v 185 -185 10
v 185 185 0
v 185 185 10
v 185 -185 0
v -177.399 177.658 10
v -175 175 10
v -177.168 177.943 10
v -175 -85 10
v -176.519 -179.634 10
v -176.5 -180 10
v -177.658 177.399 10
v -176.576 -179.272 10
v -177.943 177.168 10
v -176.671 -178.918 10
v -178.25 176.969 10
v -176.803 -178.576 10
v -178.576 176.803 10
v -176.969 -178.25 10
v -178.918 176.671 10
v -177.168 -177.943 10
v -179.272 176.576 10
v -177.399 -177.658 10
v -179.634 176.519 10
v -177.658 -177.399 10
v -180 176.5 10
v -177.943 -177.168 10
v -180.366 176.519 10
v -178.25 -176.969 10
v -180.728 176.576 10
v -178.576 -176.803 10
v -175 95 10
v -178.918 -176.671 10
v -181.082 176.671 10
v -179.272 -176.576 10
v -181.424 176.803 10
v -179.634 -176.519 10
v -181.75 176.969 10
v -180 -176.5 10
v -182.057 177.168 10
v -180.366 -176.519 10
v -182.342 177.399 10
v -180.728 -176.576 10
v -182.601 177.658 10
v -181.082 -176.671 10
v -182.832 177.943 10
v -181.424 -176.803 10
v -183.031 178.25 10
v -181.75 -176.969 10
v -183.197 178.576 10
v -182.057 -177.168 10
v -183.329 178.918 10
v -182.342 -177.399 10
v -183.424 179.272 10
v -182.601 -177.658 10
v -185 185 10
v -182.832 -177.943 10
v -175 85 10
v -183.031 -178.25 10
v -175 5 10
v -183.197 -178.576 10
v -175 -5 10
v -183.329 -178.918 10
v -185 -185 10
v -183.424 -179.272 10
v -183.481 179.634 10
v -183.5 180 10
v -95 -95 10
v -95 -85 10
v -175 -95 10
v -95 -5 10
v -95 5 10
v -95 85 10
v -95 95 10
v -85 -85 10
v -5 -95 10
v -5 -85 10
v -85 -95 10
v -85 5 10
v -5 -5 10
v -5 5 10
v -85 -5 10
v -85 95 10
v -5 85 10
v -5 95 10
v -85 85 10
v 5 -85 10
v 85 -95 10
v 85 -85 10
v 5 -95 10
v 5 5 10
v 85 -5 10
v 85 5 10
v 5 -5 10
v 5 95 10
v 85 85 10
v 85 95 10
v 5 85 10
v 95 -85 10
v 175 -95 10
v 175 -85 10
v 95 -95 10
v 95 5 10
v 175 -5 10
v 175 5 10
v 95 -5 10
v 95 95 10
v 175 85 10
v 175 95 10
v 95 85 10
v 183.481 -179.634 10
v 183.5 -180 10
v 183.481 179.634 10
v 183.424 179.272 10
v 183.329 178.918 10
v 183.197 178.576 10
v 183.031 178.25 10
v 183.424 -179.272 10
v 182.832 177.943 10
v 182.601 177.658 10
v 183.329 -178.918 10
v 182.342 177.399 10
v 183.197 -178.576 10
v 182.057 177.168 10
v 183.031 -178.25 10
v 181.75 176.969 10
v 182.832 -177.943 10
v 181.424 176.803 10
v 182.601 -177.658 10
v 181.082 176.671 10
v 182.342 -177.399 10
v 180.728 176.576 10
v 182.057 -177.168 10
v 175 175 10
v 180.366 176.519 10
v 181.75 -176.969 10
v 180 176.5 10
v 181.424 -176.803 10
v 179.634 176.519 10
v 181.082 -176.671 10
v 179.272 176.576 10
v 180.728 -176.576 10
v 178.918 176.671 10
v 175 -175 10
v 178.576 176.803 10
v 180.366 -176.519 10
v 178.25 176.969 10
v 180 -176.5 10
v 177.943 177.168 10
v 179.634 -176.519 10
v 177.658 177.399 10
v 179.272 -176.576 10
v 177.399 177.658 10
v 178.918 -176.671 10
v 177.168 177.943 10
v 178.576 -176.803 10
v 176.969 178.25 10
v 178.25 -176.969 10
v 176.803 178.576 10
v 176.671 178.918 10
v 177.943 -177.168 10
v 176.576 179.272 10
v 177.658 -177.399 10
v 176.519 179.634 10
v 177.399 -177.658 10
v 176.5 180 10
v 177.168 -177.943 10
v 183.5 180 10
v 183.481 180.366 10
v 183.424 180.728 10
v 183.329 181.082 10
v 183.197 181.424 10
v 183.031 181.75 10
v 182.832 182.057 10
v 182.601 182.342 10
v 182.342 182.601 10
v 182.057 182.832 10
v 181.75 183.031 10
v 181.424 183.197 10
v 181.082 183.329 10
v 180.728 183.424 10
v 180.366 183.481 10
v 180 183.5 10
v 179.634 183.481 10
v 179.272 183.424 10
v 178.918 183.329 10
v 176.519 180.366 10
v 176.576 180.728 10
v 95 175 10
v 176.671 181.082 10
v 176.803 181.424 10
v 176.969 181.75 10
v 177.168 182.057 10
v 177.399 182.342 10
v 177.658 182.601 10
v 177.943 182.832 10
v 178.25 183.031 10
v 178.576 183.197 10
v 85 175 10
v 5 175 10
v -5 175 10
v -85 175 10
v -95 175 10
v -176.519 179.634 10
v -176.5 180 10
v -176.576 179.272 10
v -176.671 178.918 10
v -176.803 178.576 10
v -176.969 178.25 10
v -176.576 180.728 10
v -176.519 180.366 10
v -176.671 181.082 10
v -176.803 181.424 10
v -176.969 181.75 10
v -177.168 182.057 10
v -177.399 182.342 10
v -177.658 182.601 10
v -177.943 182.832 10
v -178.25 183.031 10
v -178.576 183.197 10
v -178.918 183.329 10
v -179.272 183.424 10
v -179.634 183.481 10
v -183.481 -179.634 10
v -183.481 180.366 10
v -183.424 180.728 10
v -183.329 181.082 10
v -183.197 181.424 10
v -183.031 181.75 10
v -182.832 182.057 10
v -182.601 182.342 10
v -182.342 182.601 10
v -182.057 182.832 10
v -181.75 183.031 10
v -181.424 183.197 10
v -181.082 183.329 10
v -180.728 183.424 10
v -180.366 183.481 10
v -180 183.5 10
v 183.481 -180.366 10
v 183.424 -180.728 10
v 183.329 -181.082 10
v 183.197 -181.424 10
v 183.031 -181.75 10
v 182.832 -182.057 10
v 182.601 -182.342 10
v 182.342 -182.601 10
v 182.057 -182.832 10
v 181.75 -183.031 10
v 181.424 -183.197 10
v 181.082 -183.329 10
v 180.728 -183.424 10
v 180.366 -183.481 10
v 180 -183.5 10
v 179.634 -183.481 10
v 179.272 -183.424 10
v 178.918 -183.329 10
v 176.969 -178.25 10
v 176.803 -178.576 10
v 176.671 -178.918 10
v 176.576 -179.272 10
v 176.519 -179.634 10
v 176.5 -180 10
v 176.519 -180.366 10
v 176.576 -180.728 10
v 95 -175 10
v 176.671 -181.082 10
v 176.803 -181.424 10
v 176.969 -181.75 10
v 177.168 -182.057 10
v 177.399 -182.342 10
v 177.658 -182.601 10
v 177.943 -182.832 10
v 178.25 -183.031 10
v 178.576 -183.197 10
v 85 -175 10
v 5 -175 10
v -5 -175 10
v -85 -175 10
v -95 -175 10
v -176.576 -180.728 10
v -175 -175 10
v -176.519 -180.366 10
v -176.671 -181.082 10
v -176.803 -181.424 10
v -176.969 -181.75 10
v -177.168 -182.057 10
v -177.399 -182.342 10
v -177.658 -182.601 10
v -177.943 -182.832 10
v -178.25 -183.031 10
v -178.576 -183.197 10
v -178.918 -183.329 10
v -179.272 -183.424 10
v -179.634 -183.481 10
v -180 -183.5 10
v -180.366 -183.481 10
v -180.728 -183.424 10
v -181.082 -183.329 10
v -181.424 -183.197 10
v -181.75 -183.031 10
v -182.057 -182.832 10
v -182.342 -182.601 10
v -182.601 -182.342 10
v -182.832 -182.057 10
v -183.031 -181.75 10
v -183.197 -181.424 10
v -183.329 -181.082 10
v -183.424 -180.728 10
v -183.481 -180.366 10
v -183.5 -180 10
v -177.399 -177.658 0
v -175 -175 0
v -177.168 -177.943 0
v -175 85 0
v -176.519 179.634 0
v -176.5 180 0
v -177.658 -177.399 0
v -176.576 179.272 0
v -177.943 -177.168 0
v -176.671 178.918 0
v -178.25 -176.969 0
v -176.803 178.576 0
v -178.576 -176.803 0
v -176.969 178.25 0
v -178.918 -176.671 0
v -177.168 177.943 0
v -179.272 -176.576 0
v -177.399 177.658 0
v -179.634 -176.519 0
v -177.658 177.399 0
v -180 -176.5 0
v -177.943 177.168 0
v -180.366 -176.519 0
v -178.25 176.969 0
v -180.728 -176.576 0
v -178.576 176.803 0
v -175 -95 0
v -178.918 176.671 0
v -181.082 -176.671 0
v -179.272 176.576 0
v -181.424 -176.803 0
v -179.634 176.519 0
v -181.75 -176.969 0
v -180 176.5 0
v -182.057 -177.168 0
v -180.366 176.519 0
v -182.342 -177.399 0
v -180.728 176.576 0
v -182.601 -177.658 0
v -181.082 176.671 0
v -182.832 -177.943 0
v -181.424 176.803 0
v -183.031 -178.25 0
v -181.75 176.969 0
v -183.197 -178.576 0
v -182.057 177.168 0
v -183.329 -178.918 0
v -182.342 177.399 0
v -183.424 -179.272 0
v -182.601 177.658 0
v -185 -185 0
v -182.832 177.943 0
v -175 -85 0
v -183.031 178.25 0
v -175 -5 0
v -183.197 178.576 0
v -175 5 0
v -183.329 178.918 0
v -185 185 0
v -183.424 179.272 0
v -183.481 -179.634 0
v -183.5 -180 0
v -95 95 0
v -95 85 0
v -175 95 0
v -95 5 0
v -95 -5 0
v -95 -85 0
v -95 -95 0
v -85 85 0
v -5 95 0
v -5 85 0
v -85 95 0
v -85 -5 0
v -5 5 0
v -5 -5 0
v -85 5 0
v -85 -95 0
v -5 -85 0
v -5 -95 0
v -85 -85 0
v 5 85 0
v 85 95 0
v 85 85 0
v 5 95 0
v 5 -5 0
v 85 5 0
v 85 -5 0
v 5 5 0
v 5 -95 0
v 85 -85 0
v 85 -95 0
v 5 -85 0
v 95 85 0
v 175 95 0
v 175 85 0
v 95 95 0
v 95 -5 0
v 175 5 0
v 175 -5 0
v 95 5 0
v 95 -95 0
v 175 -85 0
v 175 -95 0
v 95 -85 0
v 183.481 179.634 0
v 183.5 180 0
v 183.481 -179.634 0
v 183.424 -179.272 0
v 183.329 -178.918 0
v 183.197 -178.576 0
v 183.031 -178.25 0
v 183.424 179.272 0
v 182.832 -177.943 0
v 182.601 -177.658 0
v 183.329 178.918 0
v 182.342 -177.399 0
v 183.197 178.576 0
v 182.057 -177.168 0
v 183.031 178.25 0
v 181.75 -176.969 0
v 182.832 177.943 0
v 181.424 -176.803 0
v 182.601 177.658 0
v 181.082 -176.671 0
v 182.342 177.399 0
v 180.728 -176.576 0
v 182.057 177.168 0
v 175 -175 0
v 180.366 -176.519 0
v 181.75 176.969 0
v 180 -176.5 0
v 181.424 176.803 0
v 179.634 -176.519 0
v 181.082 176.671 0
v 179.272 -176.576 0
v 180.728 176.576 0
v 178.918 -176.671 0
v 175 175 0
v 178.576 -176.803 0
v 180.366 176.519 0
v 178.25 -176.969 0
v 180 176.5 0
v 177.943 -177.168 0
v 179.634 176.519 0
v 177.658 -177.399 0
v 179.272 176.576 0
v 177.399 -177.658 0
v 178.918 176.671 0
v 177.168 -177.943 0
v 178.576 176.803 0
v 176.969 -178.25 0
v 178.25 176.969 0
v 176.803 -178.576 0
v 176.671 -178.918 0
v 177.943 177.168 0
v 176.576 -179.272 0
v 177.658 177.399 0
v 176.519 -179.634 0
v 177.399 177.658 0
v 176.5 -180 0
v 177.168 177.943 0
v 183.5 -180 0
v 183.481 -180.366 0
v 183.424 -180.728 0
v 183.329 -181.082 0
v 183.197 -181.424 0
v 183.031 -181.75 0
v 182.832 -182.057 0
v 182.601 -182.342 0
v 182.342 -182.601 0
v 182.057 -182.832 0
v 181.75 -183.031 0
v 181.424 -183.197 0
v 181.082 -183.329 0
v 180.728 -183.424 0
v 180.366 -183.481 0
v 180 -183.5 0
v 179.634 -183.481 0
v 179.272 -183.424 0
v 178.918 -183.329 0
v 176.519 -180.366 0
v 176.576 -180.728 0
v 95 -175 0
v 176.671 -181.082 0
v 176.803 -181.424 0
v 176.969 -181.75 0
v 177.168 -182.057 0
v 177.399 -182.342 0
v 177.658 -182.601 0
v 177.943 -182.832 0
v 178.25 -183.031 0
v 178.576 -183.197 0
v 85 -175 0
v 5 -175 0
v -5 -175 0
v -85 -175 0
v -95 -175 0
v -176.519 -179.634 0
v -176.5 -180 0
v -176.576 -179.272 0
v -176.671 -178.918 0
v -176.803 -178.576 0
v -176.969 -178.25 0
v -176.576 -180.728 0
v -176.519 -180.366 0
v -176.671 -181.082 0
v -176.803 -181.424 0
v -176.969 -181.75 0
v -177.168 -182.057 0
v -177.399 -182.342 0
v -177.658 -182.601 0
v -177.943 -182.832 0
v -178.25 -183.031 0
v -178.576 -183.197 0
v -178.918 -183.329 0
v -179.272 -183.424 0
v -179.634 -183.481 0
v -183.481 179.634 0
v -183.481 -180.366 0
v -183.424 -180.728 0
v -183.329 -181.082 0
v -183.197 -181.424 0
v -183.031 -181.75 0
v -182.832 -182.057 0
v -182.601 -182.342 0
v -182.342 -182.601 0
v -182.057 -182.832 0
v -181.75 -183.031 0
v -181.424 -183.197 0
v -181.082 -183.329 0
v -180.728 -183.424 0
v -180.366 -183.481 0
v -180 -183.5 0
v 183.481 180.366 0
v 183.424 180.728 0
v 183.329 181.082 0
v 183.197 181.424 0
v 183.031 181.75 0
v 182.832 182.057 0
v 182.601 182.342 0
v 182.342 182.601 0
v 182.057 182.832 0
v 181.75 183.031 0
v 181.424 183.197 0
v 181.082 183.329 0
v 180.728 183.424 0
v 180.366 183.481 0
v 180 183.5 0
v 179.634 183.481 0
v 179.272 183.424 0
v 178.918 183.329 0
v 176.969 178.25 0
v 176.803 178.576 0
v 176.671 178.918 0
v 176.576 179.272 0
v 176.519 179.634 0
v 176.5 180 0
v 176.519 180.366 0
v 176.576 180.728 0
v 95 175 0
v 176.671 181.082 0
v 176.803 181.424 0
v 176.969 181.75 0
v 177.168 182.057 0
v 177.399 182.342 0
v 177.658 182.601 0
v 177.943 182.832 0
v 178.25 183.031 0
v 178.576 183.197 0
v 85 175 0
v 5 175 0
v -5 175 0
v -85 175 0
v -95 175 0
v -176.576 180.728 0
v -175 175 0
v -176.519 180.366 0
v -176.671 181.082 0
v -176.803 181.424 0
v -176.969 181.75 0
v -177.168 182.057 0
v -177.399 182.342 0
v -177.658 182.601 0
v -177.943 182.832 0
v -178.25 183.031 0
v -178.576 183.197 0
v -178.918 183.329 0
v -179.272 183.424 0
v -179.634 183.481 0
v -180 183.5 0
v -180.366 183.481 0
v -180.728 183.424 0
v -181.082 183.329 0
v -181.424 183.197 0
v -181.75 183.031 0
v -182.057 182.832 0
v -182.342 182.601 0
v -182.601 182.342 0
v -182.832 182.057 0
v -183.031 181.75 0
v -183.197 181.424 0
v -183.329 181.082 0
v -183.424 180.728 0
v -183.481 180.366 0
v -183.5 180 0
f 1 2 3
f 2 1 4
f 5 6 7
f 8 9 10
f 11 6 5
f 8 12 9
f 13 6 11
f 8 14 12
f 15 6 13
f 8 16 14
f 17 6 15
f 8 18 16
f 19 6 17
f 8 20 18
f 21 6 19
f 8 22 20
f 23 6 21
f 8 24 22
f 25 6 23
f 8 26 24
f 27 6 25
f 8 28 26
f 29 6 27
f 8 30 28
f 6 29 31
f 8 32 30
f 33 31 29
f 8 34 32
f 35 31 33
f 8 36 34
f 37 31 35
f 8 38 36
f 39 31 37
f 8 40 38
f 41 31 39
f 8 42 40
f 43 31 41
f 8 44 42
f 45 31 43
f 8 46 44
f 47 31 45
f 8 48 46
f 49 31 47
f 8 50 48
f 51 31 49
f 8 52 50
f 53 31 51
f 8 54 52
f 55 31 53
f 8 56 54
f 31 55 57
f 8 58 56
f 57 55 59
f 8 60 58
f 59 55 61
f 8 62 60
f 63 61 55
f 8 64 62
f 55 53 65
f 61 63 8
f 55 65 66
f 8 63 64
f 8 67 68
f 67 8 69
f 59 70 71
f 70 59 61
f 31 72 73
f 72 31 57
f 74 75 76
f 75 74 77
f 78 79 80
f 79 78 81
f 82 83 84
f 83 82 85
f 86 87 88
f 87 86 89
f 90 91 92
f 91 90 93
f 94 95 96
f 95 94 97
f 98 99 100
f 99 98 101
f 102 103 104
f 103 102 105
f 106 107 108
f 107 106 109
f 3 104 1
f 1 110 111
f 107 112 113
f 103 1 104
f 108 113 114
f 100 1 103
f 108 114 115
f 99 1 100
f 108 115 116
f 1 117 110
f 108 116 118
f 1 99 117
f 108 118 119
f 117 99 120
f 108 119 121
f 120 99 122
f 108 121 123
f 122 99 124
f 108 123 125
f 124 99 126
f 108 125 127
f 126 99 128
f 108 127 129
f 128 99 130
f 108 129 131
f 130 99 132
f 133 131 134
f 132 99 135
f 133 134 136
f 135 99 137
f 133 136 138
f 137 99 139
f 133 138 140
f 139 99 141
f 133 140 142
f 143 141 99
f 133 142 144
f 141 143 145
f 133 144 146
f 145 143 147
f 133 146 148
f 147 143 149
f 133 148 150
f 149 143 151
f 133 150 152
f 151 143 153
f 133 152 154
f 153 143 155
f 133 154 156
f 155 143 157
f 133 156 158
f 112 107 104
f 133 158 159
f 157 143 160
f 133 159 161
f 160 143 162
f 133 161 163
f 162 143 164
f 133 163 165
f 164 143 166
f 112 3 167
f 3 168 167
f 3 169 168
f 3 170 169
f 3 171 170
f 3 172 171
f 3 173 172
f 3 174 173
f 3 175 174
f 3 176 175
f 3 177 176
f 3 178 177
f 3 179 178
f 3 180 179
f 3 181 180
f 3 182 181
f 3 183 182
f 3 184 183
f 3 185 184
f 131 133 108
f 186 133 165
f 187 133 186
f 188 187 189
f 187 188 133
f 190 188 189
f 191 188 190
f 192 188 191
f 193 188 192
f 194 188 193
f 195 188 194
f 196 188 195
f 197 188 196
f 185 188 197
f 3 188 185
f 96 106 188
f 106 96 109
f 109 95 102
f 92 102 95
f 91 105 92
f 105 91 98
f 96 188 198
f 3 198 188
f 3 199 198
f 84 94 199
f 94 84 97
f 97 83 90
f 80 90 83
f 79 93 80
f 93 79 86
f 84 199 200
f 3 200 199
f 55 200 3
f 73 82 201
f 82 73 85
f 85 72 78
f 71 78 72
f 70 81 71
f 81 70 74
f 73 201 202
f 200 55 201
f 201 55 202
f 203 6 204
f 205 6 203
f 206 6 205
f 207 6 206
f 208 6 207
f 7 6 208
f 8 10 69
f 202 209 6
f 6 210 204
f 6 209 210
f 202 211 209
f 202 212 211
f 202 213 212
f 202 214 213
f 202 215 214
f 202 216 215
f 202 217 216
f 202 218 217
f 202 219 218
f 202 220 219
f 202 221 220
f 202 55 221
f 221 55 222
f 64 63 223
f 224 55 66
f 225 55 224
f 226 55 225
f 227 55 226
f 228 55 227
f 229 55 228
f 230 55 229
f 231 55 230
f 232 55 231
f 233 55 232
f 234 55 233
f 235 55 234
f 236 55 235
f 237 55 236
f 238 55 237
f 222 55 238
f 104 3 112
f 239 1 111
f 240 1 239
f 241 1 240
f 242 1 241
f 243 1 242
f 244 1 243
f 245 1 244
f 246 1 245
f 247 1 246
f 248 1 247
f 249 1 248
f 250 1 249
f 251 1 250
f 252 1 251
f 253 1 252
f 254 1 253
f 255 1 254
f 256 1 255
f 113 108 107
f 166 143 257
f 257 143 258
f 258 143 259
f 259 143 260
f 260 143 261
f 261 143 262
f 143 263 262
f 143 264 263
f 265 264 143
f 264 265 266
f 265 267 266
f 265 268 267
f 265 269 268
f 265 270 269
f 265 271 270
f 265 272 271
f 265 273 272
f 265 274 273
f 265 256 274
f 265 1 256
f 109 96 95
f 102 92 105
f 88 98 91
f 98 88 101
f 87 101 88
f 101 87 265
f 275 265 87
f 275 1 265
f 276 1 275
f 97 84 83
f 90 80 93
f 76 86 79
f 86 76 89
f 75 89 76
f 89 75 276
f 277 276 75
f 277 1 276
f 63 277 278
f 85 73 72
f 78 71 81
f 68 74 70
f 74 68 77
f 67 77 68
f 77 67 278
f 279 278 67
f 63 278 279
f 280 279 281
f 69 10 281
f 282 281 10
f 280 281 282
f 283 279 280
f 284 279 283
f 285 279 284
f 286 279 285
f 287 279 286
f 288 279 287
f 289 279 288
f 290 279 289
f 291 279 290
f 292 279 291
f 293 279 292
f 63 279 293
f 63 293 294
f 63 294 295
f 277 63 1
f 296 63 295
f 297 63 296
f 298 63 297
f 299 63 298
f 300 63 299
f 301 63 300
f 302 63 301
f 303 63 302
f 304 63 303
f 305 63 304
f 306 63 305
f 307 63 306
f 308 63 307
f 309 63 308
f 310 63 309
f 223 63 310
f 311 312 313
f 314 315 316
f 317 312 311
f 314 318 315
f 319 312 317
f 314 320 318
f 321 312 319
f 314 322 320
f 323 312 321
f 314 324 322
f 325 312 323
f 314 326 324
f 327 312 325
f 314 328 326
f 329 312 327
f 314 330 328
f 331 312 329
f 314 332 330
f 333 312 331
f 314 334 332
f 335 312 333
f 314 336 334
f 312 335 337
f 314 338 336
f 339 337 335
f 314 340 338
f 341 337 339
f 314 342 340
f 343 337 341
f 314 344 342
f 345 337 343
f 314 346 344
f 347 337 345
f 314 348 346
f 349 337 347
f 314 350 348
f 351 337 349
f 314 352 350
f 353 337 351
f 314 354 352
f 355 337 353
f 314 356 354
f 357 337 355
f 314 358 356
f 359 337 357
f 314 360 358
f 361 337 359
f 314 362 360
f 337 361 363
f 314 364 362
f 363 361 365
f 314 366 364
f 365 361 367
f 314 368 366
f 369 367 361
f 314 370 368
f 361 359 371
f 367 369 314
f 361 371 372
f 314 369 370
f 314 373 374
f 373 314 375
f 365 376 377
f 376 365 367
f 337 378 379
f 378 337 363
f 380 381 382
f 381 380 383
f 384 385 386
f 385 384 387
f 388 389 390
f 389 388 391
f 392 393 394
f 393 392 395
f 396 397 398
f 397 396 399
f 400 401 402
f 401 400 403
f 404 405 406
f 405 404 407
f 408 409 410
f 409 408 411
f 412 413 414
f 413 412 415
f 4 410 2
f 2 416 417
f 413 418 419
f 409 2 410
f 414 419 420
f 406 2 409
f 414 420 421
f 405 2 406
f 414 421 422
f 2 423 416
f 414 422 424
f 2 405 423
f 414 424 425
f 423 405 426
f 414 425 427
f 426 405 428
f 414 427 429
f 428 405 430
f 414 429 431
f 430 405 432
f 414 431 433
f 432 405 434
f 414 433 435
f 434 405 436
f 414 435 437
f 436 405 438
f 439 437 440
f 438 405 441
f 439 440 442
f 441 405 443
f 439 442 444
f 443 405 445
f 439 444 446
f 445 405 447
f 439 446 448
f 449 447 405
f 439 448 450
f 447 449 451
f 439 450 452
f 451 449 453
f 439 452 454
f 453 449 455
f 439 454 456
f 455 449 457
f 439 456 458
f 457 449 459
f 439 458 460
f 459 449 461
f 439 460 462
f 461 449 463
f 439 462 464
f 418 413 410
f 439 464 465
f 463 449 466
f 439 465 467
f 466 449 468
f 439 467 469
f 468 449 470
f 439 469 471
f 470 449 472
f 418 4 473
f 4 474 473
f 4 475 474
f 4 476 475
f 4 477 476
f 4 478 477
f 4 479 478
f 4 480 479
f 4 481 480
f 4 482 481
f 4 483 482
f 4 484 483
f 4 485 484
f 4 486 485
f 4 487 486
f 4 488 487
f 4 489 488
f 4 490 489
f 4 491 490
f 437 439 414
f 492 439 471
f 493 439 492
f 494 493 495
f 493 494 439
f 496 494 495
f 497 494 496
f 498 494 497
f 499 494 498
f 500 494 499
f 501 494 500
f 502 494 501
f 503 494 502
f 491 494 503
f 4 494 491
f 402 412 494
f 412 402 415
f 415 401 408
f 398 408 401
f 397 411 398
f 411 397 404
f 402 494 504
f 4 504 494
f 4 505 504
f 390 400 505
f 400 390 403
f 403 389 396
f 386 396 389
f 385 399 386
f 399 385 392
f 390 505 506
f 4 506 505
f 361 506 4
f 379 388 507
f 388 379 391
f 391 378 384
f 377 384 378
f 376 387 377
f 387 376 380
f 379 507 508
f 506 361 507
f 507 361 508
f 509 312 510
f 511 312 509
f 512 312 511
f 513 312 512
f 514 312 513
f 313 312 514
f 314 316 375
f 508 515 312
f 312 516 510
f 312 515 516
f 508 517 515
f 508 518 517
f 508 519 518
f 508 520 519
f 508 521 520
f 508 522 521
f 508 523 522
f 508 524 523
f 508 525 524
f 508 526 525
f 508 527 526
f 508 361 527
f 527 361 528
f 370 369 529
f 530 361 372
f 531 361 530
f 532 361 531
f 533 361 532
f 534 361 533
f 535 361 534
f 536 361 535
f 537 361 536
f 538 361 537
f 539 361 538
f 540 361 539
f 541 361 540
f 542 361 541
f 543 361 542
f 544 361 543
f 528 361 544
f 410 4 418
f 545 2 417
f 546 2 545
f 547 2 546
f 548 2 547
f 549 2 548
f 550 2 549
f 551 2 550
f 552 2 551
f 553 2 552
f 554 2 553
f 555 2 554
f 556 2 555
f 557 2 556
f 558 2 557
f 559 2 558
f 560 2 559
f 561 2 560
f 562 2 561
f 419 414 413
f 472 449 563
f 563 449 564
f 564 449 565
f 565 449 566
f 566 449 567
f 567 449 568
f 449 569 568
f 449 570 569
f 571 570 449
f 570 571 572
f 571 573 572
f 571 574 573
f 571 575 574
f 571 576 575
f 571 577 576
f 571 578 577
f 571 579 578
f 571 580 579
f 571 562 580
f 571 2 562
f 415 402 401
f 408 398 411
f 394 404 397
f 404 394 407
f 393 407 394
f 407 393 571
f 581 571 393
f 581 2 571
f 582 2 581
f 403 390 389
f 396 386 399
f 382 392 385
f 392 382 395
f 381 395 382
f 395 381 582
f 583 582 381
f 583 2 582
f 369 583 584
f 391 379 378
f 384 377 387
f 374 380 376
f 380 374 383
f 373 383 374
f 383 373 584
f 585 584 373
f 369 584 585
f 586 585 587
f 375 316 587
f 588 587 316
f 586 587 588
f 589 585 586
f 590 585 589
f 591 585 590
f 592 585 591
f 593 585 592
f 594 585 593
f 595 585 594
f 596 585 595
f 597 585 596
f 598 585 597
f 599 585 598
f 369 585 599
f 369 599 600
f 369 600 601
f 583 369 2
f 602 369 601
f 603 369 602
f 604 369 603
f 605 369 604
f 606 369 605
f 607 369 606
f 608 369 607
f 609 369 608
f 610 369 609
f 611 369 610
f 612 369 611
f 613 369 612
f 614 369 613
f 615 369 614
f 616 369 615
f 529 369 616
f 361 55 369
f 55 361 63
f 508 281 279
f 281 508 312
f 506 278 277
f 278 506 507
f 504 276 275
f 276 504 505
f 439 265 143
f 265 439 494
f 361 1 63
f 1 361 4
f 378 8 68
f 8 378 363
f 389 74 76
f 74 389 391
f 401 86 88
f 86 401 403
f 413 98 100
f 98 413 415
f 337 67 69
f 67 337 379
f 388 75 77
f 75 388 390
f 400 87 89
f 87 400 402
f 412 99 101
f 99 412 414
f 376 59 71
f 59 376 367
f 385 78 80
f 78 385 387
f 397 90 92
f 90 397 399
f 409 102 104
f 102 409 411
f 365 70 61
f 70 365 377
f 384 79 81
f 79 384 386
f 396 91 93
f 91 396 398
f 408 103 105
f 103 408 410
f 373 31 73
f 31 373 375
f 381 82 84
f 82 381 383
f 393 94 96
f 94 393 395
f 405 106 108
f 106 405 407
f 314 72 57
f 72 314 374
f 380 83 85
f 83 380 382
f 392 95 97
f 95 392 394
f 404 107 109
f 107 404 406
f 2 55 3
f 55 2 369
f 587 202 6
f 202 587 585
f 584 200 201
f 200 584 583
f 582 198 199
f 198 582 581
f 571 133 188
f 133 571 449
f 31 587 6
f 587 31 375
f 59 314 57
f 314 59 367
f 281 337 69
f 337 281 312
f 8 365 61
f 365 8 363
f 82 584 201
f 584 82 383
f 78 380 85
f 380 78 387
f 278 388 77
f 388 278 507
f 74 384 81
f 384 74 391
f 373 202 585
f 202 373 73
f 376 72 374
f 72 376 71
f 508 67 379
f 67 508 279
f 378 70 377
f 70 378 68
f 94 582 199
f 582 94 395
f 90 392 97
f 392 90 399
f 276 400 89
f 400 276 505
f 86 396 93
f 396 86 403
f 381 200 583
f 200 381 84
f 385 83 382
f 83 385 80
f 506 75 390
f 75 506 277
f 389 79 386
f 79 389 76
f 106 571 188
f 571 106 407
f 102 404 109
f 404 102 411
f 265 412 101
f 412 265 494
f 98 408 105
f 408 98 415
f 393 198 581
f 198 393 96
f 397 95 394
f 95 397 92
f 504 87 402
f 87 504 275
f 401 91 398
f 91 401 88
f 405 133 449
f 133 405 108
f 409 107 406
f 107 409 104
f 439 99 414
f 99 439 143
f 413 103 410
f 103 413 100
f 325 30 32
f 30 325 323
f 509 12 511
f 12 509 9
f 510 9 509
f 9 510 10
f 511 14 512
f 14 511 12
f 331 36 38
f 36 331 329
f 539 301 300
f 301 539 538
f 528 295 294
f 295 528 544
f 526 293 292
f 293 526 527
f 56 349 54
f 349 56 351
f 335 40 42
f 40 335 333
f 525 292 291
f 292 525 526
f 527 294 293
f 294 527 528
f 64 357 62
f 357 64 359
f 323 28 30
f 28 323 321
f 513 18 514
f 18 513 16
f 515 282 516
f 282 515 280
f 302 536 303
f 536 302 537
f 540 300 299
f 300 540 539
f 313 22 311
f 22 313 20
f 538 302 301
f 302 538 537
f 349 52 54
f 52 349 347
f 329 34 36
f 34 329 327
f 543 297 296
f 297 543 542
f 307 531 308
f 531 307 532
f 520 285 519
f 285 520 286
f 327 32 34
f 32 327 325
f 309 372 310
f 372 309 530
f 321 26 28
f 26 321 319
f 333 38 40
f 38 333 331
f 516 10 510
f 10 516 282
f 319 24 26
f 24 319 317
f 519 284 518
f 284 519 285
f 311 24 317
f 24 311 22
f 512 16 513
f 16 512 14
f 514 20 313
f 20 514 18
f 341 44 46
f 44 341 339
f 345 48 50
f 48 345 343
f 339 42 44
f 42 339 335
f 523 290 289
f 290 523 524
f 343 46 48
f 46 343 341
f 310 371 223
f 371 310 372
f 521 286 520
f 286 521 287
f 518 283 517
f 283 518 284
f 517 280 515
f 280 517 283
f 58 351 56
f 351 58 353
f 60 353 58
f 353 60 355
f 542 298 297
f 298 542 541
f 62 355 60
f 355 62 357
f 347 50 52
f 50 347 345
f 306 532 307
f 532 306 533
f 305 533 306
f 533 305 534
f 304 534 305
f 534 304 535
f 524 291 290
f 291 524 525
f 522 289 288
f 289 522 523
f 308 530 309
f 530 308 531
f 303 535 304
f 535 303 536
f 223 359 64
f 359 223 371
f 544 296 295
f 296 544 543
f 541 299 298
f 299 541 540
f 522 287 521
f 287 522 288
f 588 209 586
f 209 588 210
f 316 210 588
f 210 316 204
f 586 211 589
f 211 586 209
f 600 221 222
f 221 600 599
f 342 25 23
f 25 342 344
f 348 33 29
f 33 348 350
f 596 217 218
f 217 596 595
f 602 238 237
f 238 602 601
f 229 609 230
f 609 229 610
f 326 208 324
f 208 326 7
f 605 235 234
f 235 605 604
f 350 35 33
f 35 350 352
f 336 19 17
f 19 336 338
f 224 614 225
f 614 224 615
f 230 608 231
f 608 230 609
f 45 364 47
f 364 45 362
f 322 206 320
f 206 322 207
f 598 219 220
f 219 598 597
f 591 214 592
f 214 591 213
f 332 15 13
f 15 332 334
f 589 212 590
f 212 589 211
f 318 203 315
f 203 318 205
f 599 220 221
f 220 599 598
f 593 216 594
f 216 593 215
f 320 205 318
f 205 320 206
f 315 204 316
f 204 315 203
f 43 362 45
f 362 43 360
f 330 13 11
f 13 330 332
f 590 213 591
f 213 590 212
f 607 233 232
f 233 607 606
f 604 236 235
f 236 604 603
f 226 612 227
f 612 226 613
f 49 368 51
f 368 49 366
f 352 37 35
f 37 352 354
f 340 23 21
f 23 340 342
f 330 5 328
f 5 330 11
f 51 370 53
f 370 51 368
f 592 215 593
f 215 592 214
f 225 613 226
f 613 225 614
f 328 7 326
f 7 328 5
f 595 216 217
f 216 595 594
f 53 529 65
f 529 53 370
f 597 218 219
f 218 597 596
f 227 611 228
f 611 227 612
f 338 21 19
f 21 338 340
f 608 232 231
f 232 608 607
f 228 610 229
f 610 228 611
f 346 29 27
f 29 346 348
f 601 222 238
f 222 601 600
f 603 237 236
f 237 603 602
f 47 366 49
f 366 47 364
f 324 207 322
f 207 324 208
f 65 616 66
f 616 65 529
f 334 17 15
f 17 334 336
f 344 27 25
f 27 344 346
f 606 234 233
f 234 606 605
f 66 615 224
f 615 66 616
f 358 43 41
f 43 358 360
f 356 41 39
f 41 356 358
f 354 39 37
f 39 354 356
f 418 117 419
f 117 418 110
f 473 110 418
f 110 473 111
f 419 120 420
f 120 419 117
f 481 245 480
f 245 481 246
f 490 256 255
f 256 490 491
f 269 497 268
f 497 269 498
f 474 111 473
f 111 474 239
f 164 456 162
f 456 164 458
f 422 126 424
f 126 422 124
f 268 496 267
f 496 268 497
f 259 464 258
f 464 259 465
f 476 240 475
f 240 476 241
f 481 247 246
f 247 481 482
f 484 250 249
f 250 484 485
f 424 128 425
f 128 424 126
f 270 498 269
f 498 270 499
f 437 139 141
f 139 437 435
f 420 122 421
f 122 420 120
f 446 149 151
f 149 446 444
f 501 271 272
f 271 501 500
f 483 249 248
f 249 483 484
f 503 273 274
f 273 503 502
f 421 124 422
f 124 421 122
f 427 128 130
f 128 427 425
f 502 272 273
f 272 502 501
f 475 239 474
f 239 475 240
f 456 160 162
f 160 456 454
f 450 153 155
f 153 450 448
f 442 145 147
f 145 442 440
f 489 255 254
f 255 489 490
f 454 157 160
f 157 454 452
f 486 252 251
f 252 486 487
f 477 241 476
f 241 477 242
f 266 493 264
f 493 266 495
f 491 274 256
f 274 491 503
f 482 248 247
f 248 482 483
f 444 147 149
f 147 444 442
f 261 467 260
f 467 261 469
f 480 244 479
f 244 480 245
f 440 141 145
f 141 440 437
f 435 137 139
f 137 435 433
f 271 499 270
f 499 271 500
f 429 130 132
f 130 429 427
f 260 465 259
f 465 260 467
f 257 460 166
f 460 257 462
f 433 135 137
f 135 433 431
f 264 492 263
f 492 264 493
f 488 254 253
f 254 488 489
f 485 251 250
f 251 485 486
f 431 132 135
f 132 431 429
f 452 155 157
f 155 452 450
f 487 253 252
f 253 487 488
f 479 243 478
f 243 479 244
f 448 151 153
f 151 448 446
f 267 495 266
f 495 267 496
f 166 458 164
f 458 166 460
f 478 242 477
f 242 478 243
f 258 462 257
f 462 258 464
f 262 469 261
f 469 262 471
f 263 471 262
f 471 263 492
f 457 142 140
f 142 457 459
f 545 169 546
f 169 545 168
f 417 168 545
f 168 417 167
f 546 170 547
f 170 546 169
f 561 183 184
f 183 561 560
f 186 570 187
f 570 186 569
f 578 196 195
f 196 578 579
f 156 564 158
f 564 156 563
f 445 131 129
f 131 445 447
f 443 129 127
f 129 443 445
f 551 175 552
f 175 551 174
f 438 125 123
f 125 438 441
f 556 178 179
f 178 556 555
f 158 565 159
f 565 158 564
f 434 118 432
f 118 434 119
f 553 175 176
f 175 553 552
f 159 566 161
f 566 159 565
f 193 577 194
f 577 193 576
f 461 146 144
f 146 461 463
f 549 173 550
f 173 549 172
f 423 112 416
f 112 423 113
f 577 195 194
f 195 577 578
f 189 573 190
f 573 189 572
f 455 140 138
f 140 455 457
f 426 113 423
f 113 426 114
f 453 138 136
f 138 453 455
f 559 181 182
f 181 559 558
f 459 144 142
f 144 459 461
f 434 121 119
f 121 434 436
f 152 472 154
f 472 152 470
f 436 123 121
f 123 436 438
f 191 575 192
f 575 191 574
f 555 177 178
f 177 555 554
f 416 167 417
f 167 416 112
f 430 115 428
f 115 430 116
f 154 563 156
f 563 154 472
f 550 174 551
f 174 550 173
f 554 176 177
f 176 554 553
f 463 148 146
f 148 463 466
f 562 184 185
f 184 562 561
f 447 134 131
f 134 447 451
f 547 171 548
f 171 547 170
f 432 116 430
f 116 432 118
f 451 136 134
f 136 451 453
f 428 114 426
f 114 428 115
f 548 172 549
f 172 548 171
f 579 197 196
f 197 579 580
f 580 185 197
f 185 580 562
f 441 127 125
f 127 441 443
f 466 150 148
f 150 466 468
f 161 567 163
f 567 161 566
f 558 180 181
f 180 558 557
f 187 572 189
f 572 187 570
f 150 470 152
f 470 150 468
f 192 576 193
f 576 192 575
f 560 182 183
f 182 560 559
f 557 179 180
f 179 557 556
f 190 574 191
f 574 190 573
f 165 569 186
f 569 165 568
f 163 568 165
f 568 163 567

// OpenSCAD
$fn=60;
module grid_frame() {
    difference() {
        union() {
            // Horizontal Bars (X-aligned)
            for (y = [-180 : 90 : 180]) {
                translate([-185, y - 5, 0]) cube([370, 10, 10]);
            }
            // Vertical Bars (Y-aligned)
            for (x = [-180 : 90 : 180]) {
                translate([x - 5, -185, 0]) cube([10, 370, 10]);
            }
        }
        // Corner Holes for M6 Rods
        for (hx = [-180, 180]) {
            for (hy = [-180, 180]) {
                translate([hx, hy, -1]) cylinder(d=7, h=12);
            }
        }
    }
}
grid_frame();
